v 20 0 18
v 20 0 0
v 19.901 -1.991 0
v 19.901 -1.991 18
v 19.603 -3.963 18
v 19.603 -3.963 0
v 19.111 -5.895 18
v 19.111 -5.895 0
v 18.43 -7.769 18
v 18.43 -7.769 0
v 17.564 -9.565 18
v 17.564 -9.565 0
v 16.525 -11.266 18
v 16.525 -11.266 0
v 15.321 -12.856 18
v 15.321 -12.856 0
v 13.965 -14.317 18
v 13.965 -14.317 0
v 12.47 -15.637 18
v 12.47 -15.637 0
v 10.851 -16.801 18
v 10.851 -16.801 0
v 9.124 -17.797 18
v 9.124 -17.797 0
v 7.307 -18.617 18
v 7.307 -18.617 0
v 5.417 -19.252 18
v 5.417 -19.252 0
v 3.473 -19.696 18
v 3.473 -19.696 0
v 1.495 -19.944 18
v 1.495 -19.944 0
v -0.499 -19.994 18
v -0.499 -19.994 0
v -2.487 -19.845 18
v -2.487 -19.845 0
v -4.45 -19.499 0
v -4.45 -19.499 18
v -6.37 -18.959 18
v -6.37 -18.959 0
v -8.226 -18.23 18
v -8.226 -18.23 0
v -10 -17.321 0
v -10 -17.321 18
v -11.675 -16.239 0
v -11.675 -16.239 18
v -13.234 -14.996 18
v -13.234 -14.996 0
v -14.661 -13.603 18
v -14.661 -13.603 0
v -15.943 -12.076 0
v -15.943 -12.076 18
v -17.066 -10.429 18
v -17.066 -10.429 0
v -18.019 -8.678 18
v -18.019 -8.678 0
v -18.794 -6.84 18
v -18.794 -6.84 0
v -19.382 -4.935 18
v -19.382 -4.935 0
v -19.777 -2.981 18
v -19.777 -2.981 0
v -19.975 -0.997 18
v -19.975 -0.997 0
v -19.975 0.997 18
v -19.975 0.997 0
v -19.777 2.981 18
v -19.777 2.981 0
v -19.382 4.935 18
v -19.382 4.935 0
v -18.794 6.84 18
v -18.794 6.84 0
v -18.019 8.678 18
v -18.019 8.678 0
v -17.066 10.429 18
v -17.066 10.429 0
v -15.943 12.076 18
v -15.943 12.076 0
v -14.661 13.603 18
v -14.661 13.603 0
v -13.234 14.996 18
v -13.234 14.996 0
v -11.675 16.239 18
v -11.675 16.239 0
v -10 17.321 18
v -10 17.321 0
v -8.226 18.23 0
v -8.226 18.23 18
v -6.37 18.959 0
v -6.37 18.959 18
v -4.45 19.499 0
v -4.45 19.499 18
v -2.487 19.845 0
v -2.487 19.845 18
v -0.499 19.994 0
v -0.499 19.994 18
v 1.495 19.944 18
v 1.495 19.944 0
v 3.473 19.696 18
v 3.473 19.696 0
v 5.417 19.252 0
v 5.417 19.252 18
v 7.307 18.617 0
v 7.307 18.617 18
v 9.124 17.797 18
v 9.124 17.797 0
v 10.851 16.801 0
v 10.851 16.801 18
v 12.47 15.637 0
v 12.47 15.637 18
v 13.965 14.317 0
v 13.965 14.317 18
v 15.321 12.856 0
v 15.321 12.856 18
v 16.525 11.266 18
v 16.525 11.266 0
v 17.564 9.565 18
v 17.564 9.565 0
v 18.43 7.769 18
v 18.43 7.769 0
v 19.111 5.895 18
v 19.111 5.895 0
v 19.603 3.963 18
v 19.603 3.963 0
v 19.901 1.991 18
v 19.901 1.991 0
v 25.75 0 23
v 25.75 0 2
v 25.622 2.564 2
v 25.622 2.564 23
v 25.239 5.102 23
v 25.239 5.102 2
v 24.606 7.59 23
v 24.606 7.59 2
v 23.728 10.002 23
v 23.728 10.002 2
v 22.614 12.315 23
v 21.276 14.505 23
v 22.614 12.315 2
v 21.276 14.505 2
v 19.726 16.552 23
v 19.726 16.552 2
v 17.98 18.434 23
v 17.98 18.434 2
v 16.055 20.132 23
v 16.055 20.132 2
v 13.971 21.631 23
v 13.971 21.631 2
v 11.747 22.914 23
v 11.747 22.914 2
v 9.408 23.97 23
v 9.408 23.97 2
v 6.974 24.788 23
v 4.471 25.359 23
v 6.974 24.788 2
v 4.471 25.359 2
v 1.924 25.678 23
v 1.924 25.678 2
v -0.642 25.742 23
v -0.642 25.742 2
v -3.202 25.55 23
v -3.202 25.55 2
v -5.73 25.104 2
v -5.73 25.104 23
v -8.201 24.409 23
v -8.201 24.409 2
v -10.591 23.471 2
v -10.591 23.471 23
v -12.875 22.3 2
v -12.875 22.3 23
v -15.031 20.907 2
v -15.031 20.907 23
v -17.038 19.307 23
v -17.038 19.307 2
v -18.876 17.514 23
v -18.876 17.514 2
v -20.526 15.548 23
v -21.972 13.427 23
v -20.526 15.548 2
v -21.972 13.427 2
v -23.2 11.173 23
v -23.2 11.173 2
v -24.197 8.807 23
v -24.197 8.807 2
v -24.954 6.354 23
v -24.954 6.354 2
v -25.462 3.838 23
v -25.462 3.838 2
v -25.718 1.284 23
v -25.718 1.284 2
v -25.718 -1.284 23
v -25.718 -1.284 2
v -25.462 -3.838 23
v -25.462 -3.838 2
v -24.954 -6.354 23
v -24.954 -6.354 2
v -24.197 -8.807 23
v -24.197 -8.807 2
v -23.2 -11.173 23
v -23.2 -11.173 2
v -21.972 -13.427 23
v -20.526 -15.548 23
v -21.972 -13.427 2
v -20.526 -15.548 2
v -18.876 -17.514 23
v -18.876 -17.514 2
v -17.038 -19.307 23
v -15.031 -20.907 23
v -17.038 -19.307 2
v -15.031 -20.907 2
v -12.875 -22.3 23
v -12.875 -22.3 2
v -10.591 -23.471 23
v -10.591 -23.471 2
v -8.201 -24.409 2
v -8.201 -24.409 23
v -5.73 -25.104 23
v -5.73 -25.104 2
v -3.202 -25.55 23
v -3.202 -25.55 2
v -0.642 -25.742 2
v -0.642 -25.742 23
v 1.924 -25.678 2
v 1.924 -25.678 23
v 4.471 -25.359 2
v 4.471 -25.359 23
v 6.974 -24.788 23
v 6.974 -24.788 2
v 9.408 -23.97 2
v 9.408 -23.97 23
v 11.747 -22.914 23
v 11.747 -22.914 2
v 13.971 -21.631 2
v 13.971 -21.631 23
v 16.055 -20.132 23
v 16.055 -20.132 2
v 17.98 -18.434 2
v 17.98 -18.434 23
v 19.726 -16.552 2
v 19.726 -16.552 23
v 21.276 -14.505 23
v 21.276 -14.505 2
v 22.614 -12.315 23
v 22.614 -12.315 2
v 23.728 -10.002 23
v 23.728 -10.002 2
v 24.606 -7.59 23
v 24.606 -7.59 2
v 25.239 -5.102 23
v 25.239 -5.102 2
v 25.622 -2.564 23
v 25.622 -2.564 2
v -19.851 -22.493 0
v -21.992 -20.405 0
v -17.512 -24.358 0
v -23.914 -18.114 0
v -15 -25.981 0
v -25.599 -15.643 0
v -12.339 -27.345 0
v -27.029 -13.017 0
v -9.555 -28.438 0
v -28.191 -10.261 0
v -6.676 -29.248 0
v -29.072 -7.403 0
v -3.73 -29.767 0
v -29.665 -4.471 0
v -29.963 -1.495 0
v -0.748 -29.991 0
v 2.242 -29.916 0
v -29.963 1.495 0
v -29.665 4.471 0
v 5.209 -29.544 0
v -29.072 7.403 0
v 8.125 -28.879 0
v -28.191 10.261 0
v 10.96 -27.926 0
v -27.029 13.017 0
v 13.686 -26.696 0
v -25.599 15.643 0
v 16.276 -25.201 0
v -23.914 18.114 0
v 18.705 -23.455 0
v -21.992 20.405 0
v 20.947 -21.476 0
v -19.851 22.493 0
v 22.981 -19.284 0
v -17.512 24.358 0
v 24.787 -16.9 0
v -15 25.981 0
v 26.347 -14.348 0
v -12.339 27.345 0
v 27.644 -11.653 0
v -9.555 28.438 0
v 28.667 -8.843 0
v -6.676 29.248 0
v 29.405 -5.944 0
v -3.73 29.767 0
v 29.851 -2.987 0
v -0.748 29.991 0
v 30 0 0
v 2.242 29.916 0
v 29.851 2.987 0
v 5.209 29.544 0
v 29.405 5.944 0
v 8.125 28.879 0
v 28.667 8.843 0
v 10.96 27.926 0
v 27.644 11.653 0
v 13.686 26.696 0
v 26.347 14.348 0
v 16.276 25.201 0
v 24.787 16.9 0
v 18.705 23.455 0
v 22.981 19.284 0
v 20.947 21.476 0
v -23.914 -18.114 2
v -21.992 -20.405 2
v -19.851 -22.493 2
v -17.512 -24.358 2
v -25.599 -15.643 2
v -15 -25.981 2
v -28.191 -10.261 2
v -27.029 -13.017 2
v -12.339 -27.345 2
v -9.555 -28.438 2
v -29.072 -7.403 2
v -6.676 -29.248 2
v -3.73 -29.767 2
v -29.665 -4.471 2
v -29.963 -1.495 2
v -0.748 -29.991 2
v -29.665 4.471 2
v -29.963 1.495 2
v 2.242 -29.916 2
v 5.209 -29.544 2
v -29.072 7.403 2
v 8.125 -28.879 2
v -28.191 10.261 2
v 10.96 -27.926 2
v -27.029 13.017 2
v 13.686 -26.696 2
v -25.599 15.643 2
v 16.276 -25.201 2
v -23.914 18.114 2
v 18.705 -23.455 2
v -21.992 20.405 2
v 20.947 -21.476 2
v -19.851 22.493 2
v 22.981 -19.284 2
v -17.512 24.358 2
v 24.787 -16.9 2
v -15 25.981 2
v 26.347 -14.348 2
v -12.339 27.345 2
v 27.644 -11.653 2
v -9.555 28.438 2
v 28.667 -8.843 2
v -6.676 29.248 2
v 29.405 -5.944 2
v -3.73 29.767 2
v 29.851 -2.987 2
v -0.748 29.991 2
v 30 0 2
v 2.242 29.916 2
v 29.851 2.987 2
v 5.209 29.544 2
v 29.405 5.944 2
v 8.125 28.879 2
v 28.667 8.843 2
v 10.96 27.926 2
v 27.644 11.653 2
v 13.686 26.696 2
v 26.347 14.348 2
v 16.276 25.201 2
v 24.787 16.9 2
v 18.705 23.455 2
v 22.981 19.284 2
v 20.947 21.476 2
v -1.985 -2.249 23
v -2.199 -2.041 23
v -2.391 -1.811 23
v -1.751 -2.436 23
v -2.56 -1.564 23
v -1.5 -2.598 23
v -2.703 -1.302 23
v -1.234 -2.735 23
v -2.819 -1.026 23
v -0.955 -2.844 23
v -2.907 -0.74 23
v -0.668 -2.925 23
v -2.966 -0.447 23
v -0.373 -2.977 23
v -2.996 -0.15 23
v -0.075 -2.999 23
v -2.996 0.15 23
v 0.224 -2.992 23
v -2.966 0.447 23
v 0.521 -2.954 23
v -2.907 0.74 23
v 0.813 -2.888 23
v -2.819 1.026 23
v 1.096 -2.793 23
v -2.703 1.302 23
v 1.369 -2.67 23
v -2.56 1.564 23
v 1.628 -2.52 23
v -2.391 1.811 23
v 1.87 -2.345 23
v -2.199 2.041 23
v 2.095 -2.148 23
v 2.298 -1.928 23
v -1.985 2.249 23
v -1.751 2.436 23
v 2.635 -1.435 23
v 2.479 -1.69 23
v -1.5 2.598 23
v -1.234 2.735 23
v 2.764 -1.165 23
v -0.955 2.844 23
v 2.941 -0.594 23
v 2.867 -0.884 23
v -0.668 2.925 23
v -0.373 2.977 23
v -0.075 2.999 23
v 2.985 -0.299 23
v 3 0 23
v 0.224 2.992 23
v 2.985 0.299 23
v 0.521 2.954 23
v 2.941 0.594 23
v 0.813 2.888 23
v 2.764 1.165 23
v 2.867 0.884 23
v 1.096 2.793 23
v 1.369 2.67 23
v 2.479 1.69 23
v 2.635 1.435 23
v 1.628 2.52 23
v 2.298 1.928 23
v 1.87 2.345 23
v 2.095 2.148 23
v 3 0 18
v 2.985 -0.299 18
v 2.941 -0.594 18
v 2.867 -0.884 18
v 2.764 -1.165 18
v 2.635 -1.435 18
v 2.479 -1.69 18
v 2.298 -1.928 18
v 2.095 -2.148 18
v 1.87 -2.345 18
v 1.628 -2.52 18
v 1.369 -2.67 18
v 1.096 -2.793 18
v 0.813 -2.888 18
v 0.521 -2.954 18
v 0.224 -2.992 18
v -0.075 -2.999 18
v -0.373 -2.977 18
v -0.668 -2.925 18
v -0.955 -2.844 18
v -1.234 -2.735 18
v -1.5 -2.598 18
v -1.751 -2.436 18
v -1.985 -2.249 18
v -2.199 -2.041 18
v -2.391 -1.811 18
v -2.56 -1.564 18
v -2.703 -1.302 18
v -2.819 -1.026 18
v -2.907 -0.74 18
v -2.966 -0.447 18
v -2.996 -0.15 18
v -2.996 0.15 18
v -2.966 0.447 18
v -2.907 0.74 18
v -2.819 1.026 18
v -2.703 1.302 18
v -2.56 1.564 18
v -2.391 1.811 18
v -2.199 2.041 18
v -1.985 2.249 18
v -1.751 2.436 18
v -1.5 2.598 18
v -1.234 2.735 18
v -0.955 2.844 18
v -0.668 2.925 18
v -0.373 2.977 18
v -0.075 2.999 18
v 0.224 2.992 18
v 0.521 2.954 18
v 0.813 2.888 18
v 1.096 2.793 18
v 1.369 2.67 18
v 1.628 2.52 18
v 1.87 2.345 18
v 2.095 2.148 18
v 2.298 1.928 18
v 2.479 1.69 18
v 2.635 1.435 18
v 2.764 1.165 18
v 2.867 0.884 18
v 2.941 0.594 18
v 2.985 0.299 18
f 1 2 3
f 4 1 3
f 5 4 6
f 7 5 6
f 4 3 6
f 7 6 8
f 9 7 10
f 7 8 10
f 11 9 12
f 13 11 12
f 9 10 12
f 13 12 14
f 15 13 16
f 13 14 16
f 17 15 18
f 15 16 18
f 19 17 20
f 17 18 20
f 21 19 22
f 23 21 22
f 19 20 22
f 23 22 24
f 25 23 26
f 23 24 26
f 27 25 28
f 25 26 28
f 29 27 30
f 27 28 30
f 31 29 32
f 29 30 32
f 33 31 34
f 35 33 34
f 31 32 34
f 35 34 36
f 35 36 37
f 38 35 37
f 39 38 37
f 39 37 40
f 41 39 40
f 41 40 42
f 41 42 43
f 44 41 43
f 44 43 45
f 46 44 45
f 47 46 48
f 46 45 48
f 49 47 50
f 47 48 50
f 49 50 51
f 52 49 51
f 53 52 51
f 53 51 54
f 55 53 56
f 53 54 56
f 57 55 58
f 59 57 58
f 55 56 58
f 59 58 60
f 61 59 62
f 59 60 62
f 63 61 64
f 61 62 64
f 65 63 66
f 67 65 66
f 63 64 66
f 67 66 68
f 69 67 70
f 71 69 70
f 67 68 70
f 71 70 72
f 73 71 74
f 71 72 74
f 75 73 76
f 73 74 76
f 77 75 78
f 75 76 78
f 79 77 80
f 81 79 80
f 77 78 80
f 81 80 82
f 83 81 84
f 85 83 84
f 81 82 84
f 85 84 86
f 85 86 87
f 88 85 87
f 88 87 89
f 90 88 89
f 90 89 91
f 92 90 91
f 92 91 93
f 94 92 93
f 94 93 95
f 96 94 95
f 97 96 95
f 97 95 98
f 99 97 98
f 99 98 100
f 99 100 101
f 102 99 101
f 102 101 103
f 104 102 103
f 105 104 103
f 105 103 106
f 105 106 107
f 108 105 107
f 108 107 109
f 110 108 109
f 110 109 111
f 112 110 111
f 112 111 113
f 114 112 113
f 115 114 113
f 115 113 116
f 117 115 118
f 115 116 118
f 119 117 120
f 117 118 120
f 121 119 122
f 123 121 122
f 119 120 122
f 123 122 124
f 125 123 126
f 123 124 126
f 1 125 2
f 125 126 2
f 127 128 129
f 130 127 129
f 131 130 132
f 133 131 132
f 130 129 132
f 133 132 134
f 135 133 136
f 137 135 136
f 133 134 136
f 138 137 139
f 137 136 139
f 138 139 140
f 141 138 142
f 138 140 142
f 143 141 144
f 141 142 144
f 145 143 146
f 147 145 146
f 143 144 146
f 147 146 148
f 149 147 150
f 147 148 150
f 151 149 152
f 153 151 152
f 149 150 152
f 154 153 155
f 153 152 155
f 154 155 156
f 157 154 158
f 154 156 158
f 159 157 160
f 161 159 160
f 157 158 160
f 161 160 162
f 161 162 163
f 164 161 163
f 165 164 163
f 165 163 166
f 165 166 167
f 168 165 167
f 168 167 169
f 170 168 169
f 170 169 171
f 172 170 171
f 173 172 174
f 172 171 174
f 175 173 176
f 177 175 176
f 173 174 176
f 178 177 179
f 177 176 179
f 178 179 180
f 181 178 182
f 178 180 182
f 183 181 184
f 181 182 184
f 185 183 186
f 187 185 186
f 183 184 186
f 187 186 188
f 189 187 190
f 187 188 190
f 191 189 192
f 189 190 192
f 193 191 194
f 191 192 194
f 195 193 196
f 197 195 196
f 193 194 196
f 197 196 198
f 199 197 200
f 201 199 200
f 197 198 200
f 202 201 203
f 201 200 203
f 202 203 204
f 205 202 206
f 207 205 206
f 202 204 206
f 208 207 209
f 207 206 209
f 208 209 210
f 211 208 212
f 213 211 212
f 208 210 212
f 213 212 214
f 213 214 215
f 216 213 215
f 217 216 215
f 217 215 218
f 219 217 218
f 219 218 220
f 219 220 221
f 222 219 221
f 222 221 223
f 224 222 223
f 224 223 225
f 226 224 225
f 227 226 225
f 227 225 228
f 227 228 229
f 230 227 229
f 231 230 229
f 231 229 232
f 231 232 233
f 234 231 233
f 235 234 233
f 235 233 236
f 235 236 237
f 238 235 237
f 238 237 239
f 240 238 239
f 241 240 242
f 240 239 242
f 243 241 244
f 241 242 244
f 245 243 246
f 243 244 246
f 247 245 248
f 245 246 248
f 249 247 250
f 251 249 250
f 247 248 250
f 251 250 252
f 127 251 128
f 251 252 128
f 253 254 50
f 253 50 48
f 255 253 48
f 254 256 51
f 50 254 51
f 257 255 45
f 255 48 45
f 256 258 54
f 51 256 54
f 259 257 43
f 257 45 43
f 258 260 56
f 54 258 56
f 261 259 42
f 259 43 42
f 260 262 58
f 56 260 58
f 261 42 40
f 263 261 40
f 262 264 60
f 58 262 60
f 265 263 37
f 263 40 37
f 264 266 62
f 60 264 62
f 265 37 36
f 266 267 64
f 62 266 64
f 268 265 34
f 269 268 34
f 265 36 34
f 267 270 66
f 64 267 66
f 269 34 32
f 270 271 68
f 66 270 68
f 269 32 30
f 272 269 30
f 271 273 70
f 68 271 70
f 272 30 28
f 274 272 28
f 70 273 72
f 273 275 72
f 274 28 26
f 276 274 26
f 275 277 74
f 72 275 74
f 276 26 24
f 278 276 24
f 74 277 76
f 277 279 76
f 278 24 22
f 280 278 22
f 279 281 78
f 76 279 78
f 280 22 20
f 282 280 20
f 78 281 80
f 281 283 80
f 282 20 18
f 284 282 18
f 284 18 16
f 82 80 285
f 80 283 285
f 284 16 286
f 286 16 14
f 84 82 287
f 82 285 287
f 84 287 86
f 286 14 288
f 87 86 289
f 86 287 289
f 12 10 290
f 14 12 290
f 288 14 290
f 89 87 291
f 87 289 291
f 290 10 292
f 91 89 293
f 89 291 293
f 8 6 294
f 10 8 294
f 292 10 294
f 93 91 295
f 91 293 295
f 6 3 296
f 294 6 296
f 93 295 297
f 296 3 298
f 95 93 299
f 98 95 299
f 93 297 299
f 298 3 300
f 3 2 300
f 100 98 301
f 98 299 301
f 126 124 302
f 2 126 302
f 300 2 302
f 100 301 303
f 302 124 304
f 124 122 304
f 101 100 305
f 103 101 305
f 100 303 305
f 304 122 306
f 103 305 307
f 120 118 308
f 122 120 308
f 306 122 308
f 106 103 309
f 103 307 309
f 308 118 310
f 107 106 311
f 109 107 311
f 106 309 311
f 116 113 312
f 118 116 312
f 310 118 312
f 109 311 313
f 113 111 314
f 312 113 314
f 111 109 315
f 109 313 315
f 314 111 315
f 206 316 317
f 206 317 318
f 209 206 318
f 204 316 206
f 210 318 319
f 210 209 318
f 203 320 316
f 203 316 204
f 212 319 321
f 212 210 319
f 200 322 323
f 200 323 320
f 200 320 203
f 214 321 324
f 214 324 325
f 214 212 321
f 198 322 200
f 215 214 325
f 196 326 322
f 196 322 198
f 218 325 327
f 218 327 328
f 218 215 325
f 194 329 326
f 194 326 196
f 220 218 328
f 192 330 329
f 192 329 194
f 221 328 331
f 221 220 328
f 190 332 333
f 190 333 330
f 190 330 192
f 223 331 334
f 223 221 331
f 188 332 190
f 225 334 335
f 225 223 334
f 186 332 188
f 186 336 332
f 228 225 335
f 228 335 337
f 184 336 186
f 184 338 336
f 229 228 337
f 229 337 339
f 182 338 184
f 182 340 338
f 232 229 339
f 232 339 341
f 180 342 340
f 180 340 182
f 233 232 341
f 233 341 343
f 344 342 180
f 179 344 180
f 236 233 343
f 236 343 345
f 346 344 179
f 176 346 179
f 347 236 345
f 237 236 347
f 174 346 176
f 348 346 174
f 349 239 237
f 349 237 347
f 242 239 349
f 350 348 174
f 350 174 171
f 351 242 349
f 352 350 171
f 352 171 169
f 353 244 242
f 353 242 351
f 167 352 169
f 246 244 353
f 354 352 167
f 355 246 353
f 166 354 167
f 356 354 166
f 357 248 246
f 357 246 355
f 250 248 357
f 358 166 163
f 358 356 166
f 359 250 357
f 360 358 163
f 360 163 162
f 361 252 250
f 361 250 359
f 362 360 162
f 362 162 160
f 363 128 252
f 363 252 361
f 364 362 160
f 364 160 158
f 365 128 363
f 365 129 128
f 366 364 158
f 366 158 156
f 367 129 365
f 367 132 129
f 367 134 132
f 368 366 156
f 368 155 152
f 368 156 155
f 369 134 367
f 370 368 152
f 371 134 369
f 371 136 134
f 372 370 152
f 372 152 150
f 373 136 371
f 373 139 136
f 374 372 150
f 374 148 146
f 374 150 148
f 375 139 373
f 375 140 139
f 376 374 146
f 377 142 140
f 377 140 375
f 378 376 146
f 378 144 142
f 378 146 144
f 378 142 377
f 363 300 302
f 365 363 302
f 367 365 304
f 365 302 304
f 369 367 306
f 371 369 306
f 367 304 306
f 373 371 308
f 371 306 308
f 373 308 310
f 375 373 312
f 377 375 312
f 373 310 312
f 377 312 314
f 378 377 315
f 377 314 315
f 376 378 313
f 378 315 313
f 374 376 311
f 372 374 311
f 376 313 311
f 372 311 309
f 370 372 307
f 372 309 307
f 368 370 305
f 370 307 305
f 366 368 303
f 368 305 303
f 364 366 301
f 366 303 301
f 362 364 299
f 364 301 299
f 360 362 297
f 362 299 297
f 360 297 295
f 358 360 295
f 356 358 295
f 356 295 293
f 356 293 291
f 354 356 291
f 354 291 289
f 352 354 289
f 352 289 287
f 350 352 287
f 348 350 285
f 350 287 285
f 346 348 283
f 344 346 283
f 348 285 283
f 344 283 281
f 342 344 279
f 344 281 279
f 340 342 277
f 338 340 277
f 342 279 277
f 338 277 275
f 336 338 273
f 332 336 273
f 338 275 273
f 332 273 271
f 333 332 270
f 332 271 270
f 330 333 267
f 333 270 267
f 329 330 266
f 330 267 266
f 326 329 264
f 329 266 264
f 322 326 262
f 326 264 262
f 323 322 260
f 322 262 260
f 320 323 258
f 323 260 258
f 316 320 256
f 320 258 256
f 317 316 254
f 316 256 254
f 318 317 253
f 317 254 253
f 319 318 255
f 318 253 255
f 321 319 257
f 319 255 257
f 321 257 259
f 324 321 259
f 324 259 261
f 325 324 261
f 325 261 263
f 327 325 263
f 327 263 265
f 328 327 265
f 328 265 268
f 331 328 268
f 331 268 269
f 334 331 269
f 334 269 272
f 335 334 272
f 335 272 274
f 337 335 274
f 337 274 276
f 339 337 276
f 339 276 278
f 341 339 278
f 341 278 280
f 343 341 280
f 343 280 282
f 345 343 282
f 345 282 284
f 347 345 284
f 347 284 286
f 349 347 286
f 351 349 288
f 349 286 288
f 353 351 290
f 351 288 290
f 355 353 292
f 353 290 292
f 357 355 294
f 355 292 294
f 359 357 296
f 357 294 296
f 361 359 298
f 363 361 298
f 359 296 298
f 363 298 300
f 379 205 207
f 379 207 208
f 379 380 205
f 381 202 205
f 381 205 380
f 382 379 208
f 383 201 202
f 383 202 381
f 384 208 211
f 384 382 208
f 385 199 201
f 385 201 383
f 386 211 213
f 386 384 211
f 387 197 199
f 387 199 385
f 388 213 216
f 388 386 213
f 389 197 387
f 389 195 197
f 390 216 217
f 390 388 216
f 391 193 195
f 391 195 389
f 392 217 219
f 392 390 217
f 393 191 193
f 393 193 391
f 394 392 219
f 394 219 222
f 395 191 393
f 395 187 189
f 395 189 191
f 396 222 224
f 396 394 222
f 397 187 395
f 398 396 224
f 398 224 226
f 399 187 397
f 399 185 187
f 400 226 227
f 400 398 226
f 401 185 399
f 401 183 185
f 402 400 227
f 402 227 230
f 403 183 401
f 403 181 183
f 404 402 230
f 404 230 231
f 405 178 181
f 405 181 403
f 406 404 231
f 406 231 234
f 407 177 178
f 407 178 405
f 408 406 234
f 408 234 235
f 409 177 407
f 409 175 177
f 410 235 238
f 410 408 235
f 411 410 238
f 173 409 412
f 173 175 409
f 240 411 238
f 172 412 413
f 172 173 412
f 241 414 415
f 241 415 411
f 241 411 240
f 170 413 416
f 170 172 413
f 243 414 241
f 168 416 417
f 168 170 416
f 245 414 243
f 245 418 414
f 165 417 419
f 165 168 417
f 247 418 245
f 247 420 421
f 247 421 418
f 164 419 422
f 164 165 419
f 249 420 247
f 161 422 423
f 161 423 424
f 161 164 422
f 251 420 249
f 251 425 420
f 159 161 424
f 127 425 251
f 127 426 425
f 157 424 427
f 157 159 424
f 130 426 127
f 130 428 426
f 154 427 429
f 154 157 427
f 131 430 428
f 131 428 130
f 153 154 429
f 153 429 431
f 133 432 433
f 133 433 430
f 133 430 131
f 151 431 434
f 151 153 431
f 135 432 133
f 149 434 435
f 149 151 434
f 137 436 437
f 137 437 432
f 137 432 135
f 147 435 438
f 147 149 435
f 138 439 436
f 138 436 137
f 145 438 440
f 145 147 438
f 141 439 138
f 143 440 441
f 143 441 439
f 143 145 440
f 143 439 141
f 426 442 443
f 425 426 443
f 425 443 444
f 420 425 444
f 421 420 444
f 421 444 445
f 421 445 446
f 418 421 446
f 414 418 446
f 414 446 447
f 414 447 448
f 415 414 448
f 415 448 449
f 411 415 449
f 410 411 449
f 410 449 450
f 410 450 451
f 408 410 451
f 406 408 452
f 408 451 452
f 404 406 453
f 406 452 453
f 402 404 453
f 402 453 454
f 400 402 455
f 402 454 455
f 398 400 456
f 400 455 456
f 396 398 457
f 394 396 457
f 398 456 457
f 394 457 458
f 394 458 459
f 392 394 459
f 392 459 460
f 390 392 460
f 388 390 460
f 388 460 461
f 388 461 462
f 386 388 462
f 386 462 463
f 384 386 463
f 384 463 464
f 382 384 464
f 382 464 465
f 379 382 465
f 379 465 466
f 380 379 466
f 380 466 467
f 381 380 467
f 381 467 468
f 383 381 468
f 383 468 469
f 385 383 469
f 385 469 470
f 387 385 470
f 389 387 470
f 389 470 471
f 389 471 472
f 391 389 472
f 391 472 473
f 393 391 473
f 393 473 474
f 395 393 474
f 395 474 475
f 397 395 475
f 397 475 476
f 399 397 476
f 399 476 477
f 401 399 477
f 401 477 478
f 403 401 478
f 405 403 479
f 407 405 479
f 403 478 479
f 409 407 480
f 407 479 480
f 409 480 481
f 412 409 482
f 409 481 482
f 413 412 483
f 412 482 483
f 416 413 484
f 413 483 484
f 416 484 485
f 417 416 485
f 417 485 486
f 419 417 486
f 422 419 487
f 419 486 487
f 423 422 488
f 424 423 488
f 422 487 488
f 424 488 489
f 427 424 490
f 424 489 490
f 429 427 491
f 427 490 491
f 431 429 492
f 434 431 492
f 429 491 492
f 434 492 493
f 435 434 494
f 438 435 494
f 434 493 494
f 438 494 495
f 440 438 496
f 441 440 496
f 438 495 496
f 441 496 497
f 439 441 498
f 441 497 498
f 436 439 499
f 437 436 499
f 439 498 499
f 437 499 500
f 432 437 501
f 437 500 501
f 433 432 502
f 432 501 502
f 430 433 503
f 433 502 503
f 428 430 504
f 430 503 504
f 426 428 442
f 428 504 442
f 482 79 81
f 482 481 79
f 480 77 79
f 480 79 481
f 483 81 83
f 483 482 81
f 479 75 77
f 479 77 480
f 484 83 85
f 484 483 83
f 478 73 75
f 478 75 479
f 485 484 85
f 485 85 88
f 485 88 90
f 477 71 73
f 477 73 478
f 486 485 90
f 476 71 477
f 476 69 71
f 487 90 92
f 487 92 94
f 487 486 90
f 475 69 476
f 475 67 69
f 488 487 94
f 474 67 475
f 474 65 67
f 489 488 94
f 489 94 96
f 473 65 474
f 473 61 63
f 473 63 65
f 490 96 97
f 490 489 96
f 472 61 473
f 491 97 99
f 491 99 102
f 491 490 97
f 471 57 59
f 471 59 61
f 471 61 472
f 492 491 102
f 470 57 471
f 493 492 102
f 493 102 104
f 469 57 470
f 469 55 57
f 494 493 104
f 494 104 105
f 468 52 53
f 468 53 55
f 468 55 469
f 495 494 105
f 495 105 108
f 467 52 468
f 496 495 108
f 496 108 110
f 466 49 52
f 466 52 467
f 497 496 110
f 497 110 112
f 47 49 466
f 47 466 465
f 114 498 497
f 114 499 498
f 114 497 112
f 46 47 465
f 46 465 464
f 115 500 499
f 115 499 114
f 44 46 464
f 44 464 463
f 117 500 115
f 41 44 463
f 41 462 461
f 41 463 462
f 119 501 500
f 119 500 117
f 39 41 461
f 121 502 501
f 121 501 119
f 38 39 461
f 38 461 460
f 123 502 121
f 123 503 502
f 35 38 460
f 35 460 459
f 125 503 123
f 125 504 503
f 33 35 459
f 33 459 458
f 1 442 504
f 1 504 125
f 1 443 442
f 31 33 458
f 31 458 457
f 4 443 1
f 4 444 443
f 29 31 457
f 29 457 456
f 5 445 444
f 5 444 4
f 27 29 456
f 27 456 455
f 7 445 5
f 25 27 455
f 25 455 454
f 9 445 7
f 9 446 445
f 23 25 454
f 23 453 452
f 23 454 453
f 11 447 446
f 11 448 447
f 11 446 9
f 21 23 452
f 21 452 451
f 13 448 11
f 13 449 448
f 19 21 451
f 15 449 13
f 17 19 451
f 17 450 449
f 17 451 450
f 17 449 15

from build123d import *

# Parameters (mm, degrees)
F0_R     = 30
F1_DEPTH = 2
F2_R     = 25.75
F3_DEPTH = 21
F4_R     = 20
F5_DEPTH = 18
F6_R     = 3
F7_DEPTH = 5.001


with BuildPart() as f1:
    # F0 (on Top) → F1 (new body)
    with BuildSketch(Plane.XY):
        Circle(F0_R)
    extrude(amount=F1_DEPTH)

    # F2 (on face) → F3 (join)
    with BuildSketch(Plane.XY.offset(2)):
        Circle(F2_R)
    extrude(amount=F3_DEPTH)

    # F4 (on face) → F5 (cut)
    with BuildSketch(Plane(origin=(0, 0, 0), x_dir=(1, 0, 0), z_dir=(0, 0, -1))):
        Circle(F4_R)
    extrude(amount=-F5_DEPTH, mode=Mode.SUBTRACT)

    # F6 (on face) → F7 (cut, through all)
    with BuildSketch(Plane(origin=(0, 0, 18), x_dir=(1, 0, 0), z_dir=(0, 0, -1))):
        Circle(F6_R)
    extrude(amount=-F7_DEPTH, mode=Mode.SUBTRACT)


solid = f1.part
